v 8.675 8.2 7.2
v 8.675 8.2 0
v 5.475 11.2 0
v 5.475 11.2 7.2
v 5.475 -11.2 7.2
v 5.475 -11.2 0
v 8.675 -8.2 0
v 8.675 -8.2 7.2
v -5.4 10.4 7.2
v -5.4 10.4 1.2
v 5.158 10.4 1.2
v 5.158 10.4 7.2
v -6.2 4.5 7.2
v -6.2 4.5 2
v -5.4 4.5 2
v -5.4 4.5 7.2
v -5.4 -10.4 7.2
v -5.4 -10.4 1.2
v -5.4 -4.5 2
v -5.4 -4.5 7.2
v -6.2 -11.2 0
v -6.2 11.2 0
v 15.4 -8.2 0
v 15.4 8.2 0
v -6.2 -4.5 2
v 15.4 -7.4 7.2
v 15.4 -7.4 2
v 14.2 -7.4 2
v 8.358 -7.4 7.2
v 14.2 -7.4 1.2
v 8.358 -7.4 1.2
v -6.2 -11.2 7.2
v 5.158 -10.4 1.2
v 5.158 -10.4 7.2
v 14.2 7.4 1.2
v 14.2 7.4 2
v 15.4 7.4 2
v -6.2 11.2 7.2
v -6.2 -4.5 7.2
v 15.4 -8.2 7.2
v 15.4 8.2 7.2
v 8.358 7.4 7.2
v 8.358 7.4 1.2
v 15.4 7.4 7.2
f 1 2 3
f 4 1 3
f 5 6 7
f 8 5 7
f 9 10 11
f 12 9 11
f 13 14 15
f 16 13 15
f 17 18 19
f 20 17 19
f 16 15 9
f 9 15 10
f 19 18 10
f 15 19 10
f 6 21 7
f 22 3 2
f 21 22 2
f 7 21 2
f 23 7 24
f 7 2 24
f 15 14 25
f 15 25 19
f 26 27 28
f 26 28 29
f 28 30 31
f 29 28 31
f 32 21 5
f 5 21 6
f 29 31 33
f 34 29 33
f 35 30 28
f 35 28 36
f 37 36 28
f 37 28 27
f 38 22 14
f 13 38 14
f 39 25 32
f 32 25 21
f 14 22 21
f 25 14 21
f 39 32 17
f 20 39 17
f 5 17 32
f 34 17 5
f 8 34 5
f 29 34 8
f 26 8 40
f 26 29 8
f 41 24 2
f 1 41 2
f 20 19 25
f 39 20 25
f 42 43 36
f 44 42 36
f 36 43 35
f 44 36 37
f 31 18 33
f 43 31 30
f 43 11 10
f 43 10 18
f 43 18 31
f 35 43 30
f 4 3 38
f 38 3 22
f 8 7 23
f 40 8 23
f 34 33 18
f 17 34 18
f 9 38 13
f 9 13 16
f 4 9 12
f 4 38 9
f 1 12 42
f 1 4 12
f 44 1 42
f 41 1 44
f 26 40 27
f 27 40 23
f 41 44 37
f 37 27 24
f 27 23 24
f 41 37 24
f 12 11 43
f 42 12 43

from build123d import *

# Parameters (mm, degrees)
F0_W     = 0.8
F0_H     = 9
F0_W_2   = 1.2
F0_H_2   = 14.8
F1_DEPTH = 1.2
F2_DEPTH = 2
F3_DEPTH = 2
F4_DEPTH = 7.2


with BuildPart() as f1:
    # F0 (on Top) → F1 (new body)
    with BuildSketch(Plane.XY):
        Polygon((14.2, -7.4), (14.2, 7.4), (8.358179, 7.4), (5.158179, 10.4), (-5.4, 10.4), (-5.4, 4.5), (-5.4, -4.5), (-5.4, -10.4), (5.158179, -10.4), (8.358179, -7.4), align=None)
        Polygon((15.4, 8.2), (8.674537, 8.2), (5.474537, 11.2), (-6.2, 11.2), (-6.2, 4.5), (-5.4, 4.5), (-5.4, 10.4), (5.158179, 10.4), (8.358179, 7.4), (14.2, 7.4), (15.4, 7.4), align=None)
        with Locations((-5.8, 0)):
            Rectangle(F0_W, F0_H)
        Polygon((15.4, -8.2), (15.4, -7.4), (14.2, -7.4), (8.358179, -7.4), (5.158179, -10.4), (-5.4, -10.4), (-5.4, -4.5), (-6.2, -4.5), (-6.2, -11.2), (5.474537, -11.2), (8.674537, -8.2), align=None)
        with Locations((14.8, 0)):
            Rectangle(F0_W_2, F0_H_2)
    extrude(amount=F1_DEPTH)

    # F0 (on Top) → F2 (join)
    with BuildSketch(Plane.XY):
        with Locations((-5.8, 0)):
            Rectangle(F0_W, F0_H)
    extrude(amount=F2_DEPTH)

    # F0 (on Top) → F3 (join)
    with BuildSketch(Plane.XY):
        with Locations((14.8, 0)):
            Rectangle(F0_W_2, F0_H_2)
    extrude(amount=F3_DEPTH)

    # F0 (on Top) → F4 (join)
    with BuildSketch(Plane.XY):
        Polygon((15.4, 8.2), (8.674537, 8.2), (5.474537, 11.2), (-6.2, 11.2), (-6.2, 4.5), (-5.4, 4.5), (-5.4, 10.4), (5.158179, 10.4), (8.358179, 7.4), (14.2, 7.4), (15.4, 7.4), align=None)
        Polygon((15.4, -8.2), (15.4, -7.4), (14.2, -7.4), (8.358179, -7.4), (5.158179, -10.4), (-5.4, -10.4), (-5.4, -4.5), (-6.2, -4.5), (-6.2, -11.2), (5.474537, -11.2), (8.674537, -8.2), align=None)
    extrude(amount=F4_DEPTH)


solid = f1.part
